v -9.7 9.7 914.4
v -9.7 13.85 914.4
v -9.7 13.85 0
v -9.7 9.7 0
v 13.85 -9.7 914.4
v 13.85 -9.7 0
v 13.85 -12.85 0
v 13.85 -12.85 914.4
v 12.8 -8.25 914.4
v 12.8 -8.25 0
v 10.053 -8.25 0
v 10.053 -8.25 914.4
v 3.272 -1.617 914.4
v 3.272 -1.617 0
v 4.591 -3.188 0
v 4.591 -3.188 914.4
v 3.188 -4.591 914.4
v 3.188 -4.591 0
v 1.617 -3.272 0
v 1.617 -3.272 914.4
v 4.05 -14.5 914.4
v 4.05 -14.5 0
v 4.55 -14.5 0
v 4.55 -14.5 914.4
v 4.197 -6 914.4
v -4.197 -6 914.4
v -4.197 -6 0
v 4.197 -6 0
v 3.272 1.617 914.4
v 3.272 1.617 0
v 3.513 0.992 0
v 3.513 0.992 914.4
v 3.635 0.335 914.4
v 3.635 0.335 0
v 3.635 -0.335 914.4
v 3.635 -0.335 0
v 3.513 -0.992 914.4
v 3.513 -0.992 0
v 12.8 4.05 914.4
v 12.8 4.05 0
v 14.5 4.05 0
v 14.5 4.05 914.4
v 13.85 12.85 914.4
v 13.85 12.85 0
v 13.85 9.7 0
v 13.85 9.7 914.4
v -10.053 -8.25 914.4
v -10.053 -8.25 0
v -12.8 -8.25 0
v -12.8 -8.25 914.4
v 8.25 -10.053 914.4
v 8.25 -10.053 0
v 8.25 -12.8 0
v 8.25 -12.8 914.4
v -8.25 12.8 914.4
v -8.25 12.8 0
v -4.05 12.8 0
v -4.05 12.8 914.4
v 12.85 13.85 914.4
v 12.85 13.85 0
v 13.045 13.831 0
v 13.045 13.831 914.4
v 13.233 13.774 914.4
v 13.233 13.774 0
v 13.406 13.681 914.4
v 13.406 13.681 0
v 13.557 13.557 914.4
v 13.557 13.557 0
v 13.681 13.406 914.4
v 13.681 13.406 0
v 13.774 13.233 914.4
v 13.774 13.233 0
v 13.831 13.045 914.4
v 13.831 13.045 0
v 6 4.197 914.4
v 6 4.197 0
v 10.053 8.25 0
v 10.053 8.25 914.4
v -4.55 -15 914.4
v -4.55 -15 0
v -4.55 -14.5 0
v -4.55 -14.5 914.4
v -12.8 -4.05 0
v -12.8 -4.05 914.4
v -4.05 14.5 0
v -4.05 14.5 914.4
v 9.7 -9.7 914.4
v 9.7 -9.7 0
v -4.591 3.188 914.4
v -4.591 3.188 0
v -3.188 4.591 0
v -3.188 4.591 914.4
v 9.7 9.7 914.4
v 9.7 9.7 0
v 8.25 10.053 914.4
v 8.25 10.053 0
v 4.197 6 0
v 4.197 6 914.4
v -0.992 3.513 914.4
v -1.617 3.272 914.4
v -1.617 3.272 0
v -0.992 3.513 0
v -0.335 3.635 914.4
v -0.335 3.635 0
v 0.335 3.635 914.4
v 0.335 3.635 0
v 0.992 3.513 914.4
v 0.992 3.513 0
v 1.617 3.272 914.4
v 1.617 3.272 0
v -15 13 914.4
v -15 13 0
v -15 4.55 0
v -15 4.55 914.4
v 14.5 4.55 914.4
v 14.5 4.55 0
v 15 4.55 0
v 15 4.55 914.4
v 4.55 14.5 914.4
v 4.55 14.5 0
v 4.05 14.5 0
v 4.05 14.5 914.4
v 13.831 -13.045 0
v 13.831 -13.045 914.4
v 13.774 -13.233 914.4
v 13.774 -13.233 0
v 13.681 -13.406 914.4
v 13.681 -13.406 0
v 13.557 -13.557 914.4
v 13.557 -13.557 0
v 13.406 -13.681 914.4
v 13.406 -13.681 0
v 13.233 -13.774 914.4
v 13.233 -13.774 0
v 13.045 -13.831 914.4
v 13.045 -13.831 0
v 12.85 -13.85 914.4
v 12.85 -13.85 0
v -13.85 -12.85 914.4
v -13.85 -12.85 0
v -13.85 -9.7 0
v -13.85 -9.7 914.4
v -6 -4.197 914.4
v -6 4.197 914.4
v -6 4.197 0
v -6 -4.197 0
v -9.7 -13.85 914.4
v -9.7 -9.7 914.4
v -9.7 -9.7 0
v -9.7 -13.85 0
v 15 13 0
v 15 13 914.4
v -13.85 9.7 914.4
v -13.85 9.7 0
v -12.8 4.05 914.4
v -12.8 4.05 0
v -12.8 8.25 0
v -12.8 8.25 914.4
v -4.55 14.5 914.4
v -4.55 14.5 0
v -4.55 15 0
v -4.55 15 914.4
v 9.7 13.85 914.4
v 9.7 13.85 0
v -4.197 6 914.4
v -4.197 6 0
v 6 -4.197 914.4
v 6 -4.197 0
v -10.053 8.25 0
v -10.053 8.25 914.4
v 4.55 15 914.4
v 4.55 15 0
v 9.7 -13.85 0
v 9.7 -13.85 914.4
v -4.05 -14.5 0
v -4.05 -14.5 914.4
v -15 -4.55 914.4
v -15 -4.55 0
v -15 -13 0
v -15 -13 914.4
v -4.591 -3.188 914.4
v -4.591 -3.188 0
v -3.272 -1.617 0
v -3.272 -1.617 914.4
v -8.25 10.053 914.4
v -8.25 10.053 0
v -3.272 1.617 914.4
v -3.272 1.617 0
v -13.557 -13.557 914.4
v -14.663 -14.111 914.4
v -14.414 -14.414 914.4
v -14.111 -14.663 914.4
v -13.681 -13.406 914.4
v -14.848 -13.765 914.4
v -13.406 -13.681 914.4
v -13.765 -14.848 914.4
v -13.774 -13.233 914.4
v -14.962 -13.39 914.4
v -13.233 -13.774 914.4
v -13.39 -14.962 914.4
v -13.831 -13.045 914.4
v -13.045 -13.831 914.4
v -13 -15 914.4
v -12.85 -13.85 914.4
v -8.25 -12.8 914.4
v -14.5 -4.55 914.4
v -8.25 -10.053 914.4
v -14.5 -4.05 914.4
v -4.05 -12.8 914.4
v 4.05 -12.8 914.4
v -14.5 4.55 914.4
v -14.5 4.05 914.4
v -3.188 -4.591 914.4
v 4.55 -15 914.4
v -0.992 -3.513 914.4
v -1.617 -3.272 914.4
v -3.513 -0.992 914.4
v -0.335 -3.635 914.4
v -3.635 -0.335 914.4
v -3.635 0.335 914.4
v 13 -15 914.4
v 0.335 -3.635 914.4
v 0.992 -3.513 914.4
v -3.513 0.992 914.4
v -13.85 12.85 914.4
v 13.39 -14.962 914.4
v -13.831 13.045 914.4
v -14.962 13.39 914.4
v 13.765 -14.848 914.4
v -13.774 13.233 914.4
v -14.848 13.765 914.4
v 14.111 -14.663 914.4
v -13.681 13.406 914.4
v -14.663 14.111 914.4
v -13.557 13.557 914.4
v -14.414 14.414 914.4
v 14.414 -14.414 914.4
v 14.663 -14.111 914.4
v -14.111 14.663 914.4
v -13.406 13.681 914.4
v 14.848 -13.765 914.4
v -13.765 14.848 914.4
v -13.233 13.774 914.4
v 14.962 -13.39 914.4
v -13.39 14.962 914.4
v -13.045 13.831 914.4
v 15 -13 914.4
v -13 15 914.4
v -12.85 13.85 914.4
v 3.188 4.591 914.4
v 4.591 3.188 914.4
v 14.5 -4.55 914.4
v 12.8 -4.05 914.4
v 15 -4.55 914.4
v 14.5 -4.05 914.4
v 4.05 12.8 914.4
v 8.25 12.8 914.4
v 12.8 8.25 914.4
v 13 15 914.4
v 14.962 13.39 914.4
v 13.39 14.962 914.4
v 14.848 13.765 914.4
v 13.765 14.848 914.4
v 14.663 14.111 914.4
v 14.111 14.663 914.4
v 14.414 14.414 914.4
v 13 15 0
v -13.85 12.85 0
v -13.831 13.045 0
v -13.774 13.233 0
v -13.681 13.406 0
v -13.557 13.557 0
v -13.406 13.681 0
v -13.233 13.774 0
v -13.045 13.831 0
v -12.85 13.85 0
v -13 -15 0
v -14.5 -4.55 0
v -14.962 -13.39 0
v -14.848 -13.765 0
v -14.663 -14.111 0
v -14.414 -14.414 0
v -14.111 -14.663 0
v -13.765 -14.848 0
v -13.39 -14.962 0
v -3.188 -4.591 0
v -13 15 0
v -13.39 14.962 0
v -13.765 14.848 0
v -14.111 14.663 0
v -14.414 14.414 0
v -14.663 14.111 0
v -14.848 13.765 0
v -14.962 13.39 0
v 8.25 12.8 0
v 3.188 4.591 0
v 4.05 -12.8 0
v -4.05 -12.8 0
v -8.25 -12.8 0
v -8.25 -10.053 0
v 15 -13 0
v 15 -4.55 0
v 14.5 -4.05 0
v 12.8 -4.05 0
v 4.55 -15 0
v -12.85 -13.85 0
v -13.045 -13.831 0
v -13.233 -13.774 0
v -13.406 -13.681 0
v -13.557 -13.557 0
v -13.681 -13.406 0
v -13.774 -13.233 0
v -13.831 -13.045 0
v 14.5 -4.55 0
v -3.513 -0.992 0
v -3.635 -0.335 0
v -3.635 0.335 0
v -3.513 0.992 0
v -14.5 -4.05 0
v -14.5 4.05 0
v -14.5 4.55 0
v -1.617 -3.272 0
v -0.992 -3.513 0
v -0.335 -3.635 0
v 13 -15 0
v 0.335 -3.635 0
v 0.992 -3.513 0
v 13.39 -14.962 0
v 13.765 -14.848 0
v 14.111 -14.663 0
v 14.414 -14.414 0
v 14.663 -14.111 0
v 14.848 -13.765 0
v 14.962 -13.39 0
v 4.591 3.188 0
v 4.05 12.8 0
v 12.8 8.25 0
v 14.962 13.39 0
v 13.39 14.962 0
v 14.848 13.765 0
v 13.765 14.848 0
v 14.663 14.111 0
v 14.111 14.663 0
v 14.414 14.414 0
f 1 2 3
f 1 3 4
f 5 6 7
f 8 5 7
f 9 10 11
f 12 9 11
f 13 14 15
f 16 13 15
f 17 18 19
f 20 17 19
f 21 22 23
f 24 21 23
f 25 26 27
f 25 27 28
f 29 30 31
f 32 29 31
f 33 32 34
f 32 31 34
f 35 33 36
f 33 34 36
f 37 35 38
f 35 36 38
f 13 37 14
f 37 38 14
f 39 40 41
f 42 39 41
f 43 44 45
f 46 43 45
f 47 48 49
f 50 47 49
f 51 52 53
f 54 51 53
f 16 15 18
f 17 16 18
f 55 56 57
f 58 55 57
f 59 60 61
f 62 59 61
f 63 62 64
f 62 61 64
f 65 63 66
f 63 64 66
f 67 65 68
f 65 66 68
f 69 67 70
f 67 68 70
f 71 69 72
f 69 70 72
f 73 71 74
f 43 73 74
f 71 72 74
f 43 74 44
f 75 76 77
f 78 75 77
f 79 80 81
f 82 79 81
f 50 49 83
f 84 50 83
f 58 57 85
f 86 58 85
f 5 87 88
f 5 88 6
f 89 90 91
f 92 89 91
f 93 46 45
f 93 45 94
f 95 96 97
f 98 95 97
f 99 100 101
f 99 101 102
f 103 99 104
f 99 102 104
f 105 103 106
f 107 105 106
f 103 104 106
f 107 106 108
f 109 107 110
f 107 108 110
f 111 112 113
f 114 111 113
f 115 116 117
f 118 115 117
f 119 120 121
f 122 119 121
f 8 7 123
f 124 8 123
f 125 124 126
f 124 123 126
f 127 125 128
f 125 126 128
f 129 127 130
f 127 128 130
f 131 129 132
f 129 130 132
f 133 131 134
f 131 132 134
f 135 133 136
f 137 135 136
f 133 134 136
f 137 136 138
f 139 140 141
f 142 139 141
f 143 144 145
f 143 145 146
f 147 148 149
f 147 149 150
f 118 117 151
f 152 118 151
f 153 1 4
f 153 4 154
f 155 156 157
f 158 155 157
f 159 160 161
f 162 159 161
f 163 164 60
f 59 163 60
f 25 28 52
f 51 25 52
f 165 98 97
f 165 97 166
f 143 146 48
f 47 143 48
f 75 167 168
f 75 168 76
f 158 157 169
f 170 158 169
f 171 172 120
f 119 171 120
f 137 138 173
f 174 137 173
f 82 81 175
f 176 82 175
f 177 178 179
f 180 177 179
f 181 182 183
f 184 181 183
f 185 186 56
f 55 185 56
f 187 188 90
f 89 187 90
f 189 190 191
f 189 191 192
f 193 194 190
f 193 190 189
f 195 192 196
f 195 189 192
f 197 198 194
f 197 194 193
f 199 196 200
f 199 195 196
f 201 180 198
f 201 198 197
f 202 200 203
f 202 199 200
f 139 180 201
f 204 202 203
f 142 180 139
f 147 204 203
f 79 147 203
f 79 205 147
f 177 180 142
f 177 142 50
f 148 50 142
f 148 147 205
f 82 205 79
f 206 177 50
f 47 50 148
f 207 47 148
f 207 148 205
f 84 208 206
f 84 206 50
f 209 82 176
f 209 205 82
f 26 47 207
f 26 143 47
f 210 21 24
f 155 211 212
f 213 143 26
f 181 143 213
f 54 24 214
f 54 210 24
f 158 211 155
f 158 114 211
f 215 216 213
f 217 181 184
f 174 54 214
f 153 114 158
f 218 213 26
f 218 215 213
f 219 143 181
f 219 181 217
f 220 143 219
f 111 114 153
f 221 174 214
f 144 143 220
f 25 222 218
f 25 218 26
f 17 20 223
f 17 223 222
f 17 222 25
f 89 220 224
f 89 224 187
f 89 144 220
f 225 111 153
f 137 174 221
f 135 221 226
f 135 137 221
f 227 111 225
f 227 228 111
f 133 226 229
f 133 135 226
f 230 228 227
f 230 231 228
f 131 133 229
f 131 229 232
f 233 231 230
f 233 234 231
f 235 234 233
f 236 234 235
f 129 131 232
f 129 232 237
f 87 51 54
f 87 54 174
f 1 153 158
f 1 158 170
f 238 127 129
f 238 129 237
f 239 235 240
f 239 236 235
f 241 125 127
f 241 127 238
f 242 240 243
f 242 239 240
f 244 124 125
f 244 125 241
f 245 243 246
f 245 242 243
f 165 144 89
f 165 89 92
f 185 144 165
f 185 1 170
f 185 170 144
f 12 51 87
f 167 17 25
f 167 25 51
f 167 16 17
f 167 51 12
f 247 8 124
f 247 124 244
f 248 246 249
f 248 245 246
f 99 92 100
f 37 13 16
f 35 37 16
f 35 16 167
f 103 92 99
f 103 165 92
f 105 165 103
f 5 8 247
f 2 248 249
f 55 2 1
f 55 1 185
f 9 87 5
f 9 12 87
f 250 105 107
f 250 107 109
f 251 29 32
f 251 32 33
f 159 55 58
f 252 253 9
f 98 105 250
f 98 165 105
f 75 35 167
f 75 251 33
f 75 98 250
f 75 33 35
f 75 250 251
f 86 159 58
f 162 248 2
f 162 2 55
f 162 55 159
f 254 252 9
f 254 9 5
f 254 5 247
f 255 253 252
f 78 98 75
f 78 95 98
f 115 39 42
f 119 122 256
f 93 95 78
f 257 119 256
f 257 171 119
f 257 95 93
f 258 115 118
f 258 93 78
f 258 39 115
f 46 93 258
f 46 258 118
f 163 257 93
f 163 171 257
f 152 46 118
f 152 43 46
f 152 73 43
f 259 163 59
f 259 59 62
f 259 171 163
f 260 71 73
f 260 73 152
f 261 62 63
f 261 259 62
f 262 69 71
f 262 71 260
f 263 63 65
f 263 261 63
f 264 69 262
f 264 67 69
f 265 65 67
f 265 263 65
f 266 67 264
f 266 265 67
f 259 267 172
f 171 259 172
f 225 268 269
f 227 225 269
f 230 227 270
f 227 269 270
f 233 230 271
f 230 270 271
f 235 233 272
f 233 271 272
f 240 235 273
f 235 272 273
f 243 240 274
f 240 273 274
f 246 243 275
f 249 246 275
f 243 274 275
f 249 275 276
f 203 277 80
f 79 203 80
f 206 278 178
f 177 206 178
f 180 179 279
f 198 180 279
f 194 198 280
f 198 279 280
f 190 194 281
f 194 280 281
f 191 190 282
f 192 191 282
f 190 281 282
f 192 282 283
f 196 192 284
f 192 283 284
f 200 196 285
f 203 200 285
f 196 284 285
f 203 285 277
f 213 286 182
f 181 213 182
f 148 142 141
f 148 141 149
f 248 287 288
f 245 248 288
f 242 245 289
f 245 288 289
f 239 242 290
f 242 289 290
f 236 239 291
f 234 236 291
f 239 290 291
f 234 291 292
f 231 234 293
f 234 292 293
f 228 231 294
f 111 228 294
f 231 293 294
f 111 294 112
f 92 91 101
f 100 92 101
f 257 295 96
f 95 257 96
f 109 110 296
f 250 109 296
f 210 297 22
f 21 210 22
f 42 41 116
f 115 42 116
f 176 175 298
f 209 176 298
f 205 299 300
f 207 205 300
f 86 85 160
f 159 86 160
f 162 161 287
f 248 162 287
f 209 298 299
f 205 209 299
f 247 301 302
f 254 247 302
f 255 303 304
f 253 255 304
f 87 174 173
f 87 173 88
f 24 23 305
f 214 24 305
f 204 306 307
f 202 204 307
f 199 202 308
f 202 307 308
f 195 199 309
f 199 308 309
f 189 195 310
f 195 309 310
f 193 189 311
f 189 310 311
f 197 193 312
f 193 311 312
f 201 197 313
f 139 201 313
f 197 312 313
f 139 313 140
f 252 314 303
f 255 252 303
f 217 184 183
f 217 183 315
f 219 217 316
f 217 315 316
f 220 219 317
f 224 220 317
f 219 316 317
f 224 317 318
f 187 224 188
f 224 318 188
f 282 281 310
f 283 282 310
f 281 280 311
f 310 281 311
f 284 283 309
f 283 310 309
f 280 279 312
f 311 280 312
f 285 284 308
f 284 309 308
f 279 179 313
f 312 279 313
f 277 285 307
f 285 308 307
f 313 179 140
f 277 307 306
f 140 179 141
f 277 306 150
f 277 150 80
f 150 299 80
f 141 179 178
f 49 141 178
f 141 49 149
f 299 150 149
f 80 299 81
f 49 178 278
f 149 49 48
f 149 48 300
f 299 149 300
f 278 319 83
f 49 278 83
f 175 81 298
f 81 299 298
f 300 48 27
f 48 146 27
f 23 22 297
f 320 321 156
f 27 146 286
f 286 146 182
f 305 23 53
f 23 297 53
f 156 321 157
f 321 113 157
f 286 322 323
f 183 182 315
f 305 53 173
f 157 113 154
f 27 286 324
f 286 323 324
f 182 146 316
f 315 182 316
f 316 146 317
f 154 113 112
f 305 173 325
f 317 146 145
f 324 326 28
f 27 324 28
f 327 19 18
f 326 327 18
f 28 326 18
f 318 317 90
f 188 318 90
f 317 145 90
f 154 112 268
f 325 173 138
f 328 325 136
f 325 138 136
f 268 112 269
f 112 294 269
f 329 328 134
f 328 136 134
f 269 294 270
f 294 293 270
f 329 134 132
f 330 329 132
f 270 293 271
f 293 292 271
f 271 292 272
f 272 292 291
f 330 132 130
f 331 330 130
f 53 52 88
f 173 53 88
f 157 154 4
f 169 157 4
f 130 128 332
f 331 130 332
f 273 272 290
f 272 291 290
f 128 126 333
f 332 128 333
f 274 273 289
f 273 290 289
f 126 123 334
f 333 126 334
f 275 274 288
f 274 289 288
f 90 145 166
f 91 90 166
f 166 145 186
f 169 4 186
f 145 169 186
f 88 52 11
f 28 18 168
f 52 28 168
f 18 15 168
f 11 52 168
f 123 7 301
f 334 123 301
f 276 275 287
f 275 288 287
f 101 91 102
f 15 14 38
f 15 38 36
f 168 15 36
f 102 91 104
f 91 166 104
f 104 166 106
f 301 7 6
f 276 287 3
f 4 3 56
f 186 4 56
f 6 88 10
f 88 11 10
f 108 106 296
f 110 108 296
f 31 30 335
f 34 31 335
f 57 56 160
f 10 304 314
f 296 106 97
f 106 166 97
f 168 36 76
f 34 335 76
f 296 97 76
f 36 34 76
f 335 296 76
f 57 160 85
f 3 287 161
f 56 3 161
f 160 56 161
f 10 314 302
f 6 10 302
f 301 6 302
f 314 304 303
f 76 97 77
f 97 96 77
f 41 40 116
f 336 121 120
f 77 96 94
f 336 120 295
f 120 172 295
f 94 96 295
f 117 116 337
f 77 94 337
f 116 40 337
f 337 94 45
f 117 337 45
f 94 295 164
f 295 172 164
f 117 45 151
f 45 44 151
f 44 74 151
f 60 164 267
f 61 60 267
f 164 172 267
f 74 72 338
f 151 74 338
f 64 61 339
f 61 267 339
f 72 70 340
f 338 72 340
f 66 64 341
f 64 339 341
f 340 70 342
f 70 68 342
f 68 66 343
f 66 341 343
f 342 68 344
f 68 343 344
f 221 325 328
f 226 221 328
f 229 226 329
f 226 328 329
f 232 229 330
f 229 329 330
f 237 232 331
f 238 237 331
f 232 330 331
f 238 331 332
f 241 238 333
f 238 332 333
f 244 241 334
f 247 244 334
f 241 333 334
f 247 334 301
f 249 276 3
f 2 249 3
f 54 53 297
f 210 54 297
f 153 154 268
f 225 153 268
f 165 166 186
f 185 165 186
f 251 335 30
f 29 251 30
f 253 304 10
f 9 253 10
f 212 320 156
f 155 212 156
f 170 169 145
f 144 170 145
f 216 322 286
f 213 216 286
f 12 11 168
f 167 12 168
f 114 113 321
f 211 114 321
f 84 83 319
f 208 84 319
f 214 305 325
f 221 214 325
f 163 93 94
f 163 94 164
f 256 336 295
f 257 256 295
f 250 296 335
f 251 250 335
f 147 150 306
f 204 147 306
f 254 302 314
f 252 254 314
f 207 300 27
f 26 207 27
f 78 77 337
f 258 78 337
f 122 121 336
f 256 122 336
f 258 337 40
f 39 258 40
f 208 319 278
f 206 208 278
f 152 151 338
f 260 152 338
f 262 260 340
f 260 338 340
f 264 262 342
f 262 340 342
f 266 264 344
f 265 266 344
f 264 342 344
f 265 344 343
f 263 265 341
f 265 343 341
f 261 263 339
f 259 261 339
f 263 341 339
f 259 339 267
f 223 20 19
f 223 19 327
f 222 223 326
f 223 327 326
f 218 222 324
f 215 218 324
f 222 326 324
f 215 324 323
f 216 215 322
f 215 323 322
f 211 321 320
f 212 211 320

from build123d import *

# Parameters (mm, degrees)
F1_DEPTH = 914.4


# Not quite as in the source:
# - ends of sketch curves that miss each other by under 0.0002 mm in the source are joined


with BuildPart() as f1:
    # F0 (on Top) → F1 (new body)
    with BuildSketch(Plane.XY):
        with BuildLine():
            Line((-10.053123, -8.25), (-12.8, -8.25))
            Line((-12.8, -8.25), (-12.800036, -4.05))
            Line((-12.800036, -4.05), (-14.5, -4.05))
            Line((-14.5, -4.05), (-14.5, -4.55))
            Line((-14.5, -4.55), (-15, -4.55))
            Line((-15, -4.55), (-15, -13))
            ThreePointArc((-15, -13), (-14.4142135624, -14.4142135624), (-13, -15))
            Line((-13, -15), (-4.55, -15))
            Line((-4.55, -15), (-4.55, -14.5))
            Line((-4.55, -14.5), (-4.05, -14.5))
            Line((-4.05, -14.5), (-4.05, -12.800036))
            Line((-4.05, -12.800036), (-8.25, -12.8))
            Line((-8.25, -12.8), (-8.25, -10.053123))
            Line((-8.25, -10.053123), (-4.196877, -6))
            Line((-4.196877, -6), (4.196877, -6))
            Line((4.196877, -6), (8.25, -10.053123))
            Line((8.25, -10.053123), (8.25, -12.8))
            Line((8.25, -12.8), (4.05, -12.800036))
            Line((4.05, -12.800036), (4.05, -14.5))
            Line((4.05, -14.5), (4.55, -14.5))
            Line((4.55, -14.5), (4.55, -15))
            Line((4.55, -15), (13, -15))
            ThreePointArc((13, -15), (14.4142135624, -14.4142135624), (15, -13))
            Line((15, -13), (15, -4.55))
            Line((15, -4.55), (14.5, -4.55))
            Line((14.5, -4.55), (14.5, -4.05))
            Line((14.5, -4.05), (12.800036, -4.05))
            Line((12.800036, -4.05), (12.8, -8.25))
            Line((12.8, -8.25), (10.053123, -8.25))
            Line((10.053123, -8.25), (6, -4.196877))
            Line((6, -4.196877), (6, 4.196877))
            Line((6, 4.196877), (10.053123, 8.25))
            Line((10.053123, 8.25), (12.8, 8.25))
            Line((12.8, 8.25), (12.800036, 4.05))
            Line((12.800036, 4.05), (14.5, 4.05))
            Line((14.5, 4.05), (14.5, 4.55))
            Line((14.5, 4.55), (15, 4.55))
            Line((15, 4.55), (15, 13))
            ThreePointArc((15, 13), (14.4142135624, 14.4142135624), (13, 15))
            Line((13, 15), (4.55, 15))
            Line((4.55, 15), (4.55, 14.5))
            Line((4.55, 14.5), (4.05, 14.5))
            Line((4.05, 14.5), (4.05, 12.800036))
            Line((4.05, 12.800036), (8.25, 12.8))
            Line((8.25, 12.8), (8.25, 10.053123))
            Line((8.25, 10.053123), (4.196877, 6))
            Line((4.196877, 6), (-4.196877, 6))
            Line((-4.196877, 6), (-8.25, 10.053123))
            Line((-8.25, 10.053123), (-8.25, 12.8))
            Line((-8.25, 12.8), (-4.05, 12.800036))
            Line((-4.05, 12.800036), (-4.05, 14.5))
            Line((-4.05, 14.5), (-4.55, 14.5))
            Line((-4.55, 14.5), (-4.55, 15))
            Line((-4.55, 15), (-13, 15))
            ThreePointArc((-13, 15), (-14.4142135624, 14.4142135624), (-15, 13))
            Line((-15, 13), (-15, 4.55))
            Line((-15, 4.55), (-14.5, 4.55))
            Line((-14.5, 4.55), (-14.5, 4.05))
            Line((-14.5, 4.05), (-12.800036, 4.05))
            Line((-12.800036, 4.05), (-12.8, 8.25))
            Line((-12.8, 8.25), (-10.053123, 8.25))
            Line((-10.053123, 8.25), (-6, 4.196877))
            Line((-6, 4.196877), (-6, -4.196877))
            Line((-6, -4.196877), (-10.053123, -8.25))
        make_face()
        with BuildLine():
            Line((-9.7, -13.85), (-12.85, -13.85))
            ThreePointArc((-12.85, -13.85), (-13.5571067812, -13.5571067812), (-13.85, -12.85))
            Line((-13.85, -12.85), (-13.85, -9.7))
            Line((-13.85, -9.7), (-9.7, -9.7))
            Line((-9.7, -9.7), (-9.7, -13.85))
        make_face(mode=Mode.SUBTRACT)
        with BuildLine():
            Line((12.85, -13.85), (9.7, -13.85))
            Line((9.7, -13.85), (9.7, -9.7))
            Line((9.7, -9.7), (13.85, -9.7))
            Line((13.85, -9.7), (13.85, -12.85))
            ThreePointArc((13.85, -12.85), (13.5571067812, -13.5571067812), (12.85, -13.85))
        make_face(mode=Mode.SUBTRACT)
        with BuildLine():
            Line((-9.7, 9.7), (-13.85, 9.7))
            Line((-13.85, 9.7), (-13.85, 12.85))
            ThreePointArc((-13.85, 12.85), (-13.5571067812, 13.5571067812), (-12.85, 13.85))
            Line((-12.85, 13.85), (-9.7, 13.85))
            Line((-9.7, 13.85), (-9.7, 9.7))
        make_face(mode=Mode.SUBTRACT)
        with BuildLine():
            Line((3.272394, -1.616767), (4.590523, -3.187652))
            Line((4.590523, -3.187652), (3.187652, -4.590523))
            Line((3.187652, -4.590523), (1.616767, -3.272394))
            ThreePointArc((1.616767, -3.272394), (0, -3.65), (-1.6167671199, -3.2723942427))
            Line((-1.6167671199, -3.2723942427), (-3.187652, -4.590523))
            Line((-3.187652, -4.590523), (-4.590523, -3.187652))
            Line((-4.590523, -3.187652), (-3.272394, -1.616767))
            ThreePointArc((-3.272394, -1.616767), (-3.65, 0), (-3.2723942427, 1.6167671199))
            Line((-3.2723942427, 1.6167671199), (-4.590523, 3.187652))
            Line((-4.590523, 3.187652), (-3.187652, 4.590523))
            Line((-3.187652, 4.590523), (-1.616767, 3.272394))
            ThreePointArc((-1.616767, 3.272394), (0, 3.65), (1.6167671199, 3.2723942427))
            Line((1.6167671199, 3.2723942427), (3.187652, 4.590523))
            Line((3.187652, 4.590523), (4.590523, 3.187652))
            Line((4.590523, 3.187652), (3.272394, 1.616767))
            ThreePointArc((3.272394, 1.616767), (3.65, 0), (3.272394, -1.616767))
        make_face(mode=Mode.SUBTRACT)
        with BuildLine():
            Line((13.85, 9.7), (9.7, 9.7))
            Line((9.7, 9.7), (9.7, 13.85))
            Line((9.7, 13.85), (12.85, 13.85))
            ThreePointArc((12.85, 13.85), (13.5571067812, 13.5571067812), (13.85, 12.85))
            Line((13.85, 12.85), (13.85, 9.7))
        make_face(mode=Mode.SUBTRACT)
    extrude(amount=F1_DEPTH)


solid = f1.part
